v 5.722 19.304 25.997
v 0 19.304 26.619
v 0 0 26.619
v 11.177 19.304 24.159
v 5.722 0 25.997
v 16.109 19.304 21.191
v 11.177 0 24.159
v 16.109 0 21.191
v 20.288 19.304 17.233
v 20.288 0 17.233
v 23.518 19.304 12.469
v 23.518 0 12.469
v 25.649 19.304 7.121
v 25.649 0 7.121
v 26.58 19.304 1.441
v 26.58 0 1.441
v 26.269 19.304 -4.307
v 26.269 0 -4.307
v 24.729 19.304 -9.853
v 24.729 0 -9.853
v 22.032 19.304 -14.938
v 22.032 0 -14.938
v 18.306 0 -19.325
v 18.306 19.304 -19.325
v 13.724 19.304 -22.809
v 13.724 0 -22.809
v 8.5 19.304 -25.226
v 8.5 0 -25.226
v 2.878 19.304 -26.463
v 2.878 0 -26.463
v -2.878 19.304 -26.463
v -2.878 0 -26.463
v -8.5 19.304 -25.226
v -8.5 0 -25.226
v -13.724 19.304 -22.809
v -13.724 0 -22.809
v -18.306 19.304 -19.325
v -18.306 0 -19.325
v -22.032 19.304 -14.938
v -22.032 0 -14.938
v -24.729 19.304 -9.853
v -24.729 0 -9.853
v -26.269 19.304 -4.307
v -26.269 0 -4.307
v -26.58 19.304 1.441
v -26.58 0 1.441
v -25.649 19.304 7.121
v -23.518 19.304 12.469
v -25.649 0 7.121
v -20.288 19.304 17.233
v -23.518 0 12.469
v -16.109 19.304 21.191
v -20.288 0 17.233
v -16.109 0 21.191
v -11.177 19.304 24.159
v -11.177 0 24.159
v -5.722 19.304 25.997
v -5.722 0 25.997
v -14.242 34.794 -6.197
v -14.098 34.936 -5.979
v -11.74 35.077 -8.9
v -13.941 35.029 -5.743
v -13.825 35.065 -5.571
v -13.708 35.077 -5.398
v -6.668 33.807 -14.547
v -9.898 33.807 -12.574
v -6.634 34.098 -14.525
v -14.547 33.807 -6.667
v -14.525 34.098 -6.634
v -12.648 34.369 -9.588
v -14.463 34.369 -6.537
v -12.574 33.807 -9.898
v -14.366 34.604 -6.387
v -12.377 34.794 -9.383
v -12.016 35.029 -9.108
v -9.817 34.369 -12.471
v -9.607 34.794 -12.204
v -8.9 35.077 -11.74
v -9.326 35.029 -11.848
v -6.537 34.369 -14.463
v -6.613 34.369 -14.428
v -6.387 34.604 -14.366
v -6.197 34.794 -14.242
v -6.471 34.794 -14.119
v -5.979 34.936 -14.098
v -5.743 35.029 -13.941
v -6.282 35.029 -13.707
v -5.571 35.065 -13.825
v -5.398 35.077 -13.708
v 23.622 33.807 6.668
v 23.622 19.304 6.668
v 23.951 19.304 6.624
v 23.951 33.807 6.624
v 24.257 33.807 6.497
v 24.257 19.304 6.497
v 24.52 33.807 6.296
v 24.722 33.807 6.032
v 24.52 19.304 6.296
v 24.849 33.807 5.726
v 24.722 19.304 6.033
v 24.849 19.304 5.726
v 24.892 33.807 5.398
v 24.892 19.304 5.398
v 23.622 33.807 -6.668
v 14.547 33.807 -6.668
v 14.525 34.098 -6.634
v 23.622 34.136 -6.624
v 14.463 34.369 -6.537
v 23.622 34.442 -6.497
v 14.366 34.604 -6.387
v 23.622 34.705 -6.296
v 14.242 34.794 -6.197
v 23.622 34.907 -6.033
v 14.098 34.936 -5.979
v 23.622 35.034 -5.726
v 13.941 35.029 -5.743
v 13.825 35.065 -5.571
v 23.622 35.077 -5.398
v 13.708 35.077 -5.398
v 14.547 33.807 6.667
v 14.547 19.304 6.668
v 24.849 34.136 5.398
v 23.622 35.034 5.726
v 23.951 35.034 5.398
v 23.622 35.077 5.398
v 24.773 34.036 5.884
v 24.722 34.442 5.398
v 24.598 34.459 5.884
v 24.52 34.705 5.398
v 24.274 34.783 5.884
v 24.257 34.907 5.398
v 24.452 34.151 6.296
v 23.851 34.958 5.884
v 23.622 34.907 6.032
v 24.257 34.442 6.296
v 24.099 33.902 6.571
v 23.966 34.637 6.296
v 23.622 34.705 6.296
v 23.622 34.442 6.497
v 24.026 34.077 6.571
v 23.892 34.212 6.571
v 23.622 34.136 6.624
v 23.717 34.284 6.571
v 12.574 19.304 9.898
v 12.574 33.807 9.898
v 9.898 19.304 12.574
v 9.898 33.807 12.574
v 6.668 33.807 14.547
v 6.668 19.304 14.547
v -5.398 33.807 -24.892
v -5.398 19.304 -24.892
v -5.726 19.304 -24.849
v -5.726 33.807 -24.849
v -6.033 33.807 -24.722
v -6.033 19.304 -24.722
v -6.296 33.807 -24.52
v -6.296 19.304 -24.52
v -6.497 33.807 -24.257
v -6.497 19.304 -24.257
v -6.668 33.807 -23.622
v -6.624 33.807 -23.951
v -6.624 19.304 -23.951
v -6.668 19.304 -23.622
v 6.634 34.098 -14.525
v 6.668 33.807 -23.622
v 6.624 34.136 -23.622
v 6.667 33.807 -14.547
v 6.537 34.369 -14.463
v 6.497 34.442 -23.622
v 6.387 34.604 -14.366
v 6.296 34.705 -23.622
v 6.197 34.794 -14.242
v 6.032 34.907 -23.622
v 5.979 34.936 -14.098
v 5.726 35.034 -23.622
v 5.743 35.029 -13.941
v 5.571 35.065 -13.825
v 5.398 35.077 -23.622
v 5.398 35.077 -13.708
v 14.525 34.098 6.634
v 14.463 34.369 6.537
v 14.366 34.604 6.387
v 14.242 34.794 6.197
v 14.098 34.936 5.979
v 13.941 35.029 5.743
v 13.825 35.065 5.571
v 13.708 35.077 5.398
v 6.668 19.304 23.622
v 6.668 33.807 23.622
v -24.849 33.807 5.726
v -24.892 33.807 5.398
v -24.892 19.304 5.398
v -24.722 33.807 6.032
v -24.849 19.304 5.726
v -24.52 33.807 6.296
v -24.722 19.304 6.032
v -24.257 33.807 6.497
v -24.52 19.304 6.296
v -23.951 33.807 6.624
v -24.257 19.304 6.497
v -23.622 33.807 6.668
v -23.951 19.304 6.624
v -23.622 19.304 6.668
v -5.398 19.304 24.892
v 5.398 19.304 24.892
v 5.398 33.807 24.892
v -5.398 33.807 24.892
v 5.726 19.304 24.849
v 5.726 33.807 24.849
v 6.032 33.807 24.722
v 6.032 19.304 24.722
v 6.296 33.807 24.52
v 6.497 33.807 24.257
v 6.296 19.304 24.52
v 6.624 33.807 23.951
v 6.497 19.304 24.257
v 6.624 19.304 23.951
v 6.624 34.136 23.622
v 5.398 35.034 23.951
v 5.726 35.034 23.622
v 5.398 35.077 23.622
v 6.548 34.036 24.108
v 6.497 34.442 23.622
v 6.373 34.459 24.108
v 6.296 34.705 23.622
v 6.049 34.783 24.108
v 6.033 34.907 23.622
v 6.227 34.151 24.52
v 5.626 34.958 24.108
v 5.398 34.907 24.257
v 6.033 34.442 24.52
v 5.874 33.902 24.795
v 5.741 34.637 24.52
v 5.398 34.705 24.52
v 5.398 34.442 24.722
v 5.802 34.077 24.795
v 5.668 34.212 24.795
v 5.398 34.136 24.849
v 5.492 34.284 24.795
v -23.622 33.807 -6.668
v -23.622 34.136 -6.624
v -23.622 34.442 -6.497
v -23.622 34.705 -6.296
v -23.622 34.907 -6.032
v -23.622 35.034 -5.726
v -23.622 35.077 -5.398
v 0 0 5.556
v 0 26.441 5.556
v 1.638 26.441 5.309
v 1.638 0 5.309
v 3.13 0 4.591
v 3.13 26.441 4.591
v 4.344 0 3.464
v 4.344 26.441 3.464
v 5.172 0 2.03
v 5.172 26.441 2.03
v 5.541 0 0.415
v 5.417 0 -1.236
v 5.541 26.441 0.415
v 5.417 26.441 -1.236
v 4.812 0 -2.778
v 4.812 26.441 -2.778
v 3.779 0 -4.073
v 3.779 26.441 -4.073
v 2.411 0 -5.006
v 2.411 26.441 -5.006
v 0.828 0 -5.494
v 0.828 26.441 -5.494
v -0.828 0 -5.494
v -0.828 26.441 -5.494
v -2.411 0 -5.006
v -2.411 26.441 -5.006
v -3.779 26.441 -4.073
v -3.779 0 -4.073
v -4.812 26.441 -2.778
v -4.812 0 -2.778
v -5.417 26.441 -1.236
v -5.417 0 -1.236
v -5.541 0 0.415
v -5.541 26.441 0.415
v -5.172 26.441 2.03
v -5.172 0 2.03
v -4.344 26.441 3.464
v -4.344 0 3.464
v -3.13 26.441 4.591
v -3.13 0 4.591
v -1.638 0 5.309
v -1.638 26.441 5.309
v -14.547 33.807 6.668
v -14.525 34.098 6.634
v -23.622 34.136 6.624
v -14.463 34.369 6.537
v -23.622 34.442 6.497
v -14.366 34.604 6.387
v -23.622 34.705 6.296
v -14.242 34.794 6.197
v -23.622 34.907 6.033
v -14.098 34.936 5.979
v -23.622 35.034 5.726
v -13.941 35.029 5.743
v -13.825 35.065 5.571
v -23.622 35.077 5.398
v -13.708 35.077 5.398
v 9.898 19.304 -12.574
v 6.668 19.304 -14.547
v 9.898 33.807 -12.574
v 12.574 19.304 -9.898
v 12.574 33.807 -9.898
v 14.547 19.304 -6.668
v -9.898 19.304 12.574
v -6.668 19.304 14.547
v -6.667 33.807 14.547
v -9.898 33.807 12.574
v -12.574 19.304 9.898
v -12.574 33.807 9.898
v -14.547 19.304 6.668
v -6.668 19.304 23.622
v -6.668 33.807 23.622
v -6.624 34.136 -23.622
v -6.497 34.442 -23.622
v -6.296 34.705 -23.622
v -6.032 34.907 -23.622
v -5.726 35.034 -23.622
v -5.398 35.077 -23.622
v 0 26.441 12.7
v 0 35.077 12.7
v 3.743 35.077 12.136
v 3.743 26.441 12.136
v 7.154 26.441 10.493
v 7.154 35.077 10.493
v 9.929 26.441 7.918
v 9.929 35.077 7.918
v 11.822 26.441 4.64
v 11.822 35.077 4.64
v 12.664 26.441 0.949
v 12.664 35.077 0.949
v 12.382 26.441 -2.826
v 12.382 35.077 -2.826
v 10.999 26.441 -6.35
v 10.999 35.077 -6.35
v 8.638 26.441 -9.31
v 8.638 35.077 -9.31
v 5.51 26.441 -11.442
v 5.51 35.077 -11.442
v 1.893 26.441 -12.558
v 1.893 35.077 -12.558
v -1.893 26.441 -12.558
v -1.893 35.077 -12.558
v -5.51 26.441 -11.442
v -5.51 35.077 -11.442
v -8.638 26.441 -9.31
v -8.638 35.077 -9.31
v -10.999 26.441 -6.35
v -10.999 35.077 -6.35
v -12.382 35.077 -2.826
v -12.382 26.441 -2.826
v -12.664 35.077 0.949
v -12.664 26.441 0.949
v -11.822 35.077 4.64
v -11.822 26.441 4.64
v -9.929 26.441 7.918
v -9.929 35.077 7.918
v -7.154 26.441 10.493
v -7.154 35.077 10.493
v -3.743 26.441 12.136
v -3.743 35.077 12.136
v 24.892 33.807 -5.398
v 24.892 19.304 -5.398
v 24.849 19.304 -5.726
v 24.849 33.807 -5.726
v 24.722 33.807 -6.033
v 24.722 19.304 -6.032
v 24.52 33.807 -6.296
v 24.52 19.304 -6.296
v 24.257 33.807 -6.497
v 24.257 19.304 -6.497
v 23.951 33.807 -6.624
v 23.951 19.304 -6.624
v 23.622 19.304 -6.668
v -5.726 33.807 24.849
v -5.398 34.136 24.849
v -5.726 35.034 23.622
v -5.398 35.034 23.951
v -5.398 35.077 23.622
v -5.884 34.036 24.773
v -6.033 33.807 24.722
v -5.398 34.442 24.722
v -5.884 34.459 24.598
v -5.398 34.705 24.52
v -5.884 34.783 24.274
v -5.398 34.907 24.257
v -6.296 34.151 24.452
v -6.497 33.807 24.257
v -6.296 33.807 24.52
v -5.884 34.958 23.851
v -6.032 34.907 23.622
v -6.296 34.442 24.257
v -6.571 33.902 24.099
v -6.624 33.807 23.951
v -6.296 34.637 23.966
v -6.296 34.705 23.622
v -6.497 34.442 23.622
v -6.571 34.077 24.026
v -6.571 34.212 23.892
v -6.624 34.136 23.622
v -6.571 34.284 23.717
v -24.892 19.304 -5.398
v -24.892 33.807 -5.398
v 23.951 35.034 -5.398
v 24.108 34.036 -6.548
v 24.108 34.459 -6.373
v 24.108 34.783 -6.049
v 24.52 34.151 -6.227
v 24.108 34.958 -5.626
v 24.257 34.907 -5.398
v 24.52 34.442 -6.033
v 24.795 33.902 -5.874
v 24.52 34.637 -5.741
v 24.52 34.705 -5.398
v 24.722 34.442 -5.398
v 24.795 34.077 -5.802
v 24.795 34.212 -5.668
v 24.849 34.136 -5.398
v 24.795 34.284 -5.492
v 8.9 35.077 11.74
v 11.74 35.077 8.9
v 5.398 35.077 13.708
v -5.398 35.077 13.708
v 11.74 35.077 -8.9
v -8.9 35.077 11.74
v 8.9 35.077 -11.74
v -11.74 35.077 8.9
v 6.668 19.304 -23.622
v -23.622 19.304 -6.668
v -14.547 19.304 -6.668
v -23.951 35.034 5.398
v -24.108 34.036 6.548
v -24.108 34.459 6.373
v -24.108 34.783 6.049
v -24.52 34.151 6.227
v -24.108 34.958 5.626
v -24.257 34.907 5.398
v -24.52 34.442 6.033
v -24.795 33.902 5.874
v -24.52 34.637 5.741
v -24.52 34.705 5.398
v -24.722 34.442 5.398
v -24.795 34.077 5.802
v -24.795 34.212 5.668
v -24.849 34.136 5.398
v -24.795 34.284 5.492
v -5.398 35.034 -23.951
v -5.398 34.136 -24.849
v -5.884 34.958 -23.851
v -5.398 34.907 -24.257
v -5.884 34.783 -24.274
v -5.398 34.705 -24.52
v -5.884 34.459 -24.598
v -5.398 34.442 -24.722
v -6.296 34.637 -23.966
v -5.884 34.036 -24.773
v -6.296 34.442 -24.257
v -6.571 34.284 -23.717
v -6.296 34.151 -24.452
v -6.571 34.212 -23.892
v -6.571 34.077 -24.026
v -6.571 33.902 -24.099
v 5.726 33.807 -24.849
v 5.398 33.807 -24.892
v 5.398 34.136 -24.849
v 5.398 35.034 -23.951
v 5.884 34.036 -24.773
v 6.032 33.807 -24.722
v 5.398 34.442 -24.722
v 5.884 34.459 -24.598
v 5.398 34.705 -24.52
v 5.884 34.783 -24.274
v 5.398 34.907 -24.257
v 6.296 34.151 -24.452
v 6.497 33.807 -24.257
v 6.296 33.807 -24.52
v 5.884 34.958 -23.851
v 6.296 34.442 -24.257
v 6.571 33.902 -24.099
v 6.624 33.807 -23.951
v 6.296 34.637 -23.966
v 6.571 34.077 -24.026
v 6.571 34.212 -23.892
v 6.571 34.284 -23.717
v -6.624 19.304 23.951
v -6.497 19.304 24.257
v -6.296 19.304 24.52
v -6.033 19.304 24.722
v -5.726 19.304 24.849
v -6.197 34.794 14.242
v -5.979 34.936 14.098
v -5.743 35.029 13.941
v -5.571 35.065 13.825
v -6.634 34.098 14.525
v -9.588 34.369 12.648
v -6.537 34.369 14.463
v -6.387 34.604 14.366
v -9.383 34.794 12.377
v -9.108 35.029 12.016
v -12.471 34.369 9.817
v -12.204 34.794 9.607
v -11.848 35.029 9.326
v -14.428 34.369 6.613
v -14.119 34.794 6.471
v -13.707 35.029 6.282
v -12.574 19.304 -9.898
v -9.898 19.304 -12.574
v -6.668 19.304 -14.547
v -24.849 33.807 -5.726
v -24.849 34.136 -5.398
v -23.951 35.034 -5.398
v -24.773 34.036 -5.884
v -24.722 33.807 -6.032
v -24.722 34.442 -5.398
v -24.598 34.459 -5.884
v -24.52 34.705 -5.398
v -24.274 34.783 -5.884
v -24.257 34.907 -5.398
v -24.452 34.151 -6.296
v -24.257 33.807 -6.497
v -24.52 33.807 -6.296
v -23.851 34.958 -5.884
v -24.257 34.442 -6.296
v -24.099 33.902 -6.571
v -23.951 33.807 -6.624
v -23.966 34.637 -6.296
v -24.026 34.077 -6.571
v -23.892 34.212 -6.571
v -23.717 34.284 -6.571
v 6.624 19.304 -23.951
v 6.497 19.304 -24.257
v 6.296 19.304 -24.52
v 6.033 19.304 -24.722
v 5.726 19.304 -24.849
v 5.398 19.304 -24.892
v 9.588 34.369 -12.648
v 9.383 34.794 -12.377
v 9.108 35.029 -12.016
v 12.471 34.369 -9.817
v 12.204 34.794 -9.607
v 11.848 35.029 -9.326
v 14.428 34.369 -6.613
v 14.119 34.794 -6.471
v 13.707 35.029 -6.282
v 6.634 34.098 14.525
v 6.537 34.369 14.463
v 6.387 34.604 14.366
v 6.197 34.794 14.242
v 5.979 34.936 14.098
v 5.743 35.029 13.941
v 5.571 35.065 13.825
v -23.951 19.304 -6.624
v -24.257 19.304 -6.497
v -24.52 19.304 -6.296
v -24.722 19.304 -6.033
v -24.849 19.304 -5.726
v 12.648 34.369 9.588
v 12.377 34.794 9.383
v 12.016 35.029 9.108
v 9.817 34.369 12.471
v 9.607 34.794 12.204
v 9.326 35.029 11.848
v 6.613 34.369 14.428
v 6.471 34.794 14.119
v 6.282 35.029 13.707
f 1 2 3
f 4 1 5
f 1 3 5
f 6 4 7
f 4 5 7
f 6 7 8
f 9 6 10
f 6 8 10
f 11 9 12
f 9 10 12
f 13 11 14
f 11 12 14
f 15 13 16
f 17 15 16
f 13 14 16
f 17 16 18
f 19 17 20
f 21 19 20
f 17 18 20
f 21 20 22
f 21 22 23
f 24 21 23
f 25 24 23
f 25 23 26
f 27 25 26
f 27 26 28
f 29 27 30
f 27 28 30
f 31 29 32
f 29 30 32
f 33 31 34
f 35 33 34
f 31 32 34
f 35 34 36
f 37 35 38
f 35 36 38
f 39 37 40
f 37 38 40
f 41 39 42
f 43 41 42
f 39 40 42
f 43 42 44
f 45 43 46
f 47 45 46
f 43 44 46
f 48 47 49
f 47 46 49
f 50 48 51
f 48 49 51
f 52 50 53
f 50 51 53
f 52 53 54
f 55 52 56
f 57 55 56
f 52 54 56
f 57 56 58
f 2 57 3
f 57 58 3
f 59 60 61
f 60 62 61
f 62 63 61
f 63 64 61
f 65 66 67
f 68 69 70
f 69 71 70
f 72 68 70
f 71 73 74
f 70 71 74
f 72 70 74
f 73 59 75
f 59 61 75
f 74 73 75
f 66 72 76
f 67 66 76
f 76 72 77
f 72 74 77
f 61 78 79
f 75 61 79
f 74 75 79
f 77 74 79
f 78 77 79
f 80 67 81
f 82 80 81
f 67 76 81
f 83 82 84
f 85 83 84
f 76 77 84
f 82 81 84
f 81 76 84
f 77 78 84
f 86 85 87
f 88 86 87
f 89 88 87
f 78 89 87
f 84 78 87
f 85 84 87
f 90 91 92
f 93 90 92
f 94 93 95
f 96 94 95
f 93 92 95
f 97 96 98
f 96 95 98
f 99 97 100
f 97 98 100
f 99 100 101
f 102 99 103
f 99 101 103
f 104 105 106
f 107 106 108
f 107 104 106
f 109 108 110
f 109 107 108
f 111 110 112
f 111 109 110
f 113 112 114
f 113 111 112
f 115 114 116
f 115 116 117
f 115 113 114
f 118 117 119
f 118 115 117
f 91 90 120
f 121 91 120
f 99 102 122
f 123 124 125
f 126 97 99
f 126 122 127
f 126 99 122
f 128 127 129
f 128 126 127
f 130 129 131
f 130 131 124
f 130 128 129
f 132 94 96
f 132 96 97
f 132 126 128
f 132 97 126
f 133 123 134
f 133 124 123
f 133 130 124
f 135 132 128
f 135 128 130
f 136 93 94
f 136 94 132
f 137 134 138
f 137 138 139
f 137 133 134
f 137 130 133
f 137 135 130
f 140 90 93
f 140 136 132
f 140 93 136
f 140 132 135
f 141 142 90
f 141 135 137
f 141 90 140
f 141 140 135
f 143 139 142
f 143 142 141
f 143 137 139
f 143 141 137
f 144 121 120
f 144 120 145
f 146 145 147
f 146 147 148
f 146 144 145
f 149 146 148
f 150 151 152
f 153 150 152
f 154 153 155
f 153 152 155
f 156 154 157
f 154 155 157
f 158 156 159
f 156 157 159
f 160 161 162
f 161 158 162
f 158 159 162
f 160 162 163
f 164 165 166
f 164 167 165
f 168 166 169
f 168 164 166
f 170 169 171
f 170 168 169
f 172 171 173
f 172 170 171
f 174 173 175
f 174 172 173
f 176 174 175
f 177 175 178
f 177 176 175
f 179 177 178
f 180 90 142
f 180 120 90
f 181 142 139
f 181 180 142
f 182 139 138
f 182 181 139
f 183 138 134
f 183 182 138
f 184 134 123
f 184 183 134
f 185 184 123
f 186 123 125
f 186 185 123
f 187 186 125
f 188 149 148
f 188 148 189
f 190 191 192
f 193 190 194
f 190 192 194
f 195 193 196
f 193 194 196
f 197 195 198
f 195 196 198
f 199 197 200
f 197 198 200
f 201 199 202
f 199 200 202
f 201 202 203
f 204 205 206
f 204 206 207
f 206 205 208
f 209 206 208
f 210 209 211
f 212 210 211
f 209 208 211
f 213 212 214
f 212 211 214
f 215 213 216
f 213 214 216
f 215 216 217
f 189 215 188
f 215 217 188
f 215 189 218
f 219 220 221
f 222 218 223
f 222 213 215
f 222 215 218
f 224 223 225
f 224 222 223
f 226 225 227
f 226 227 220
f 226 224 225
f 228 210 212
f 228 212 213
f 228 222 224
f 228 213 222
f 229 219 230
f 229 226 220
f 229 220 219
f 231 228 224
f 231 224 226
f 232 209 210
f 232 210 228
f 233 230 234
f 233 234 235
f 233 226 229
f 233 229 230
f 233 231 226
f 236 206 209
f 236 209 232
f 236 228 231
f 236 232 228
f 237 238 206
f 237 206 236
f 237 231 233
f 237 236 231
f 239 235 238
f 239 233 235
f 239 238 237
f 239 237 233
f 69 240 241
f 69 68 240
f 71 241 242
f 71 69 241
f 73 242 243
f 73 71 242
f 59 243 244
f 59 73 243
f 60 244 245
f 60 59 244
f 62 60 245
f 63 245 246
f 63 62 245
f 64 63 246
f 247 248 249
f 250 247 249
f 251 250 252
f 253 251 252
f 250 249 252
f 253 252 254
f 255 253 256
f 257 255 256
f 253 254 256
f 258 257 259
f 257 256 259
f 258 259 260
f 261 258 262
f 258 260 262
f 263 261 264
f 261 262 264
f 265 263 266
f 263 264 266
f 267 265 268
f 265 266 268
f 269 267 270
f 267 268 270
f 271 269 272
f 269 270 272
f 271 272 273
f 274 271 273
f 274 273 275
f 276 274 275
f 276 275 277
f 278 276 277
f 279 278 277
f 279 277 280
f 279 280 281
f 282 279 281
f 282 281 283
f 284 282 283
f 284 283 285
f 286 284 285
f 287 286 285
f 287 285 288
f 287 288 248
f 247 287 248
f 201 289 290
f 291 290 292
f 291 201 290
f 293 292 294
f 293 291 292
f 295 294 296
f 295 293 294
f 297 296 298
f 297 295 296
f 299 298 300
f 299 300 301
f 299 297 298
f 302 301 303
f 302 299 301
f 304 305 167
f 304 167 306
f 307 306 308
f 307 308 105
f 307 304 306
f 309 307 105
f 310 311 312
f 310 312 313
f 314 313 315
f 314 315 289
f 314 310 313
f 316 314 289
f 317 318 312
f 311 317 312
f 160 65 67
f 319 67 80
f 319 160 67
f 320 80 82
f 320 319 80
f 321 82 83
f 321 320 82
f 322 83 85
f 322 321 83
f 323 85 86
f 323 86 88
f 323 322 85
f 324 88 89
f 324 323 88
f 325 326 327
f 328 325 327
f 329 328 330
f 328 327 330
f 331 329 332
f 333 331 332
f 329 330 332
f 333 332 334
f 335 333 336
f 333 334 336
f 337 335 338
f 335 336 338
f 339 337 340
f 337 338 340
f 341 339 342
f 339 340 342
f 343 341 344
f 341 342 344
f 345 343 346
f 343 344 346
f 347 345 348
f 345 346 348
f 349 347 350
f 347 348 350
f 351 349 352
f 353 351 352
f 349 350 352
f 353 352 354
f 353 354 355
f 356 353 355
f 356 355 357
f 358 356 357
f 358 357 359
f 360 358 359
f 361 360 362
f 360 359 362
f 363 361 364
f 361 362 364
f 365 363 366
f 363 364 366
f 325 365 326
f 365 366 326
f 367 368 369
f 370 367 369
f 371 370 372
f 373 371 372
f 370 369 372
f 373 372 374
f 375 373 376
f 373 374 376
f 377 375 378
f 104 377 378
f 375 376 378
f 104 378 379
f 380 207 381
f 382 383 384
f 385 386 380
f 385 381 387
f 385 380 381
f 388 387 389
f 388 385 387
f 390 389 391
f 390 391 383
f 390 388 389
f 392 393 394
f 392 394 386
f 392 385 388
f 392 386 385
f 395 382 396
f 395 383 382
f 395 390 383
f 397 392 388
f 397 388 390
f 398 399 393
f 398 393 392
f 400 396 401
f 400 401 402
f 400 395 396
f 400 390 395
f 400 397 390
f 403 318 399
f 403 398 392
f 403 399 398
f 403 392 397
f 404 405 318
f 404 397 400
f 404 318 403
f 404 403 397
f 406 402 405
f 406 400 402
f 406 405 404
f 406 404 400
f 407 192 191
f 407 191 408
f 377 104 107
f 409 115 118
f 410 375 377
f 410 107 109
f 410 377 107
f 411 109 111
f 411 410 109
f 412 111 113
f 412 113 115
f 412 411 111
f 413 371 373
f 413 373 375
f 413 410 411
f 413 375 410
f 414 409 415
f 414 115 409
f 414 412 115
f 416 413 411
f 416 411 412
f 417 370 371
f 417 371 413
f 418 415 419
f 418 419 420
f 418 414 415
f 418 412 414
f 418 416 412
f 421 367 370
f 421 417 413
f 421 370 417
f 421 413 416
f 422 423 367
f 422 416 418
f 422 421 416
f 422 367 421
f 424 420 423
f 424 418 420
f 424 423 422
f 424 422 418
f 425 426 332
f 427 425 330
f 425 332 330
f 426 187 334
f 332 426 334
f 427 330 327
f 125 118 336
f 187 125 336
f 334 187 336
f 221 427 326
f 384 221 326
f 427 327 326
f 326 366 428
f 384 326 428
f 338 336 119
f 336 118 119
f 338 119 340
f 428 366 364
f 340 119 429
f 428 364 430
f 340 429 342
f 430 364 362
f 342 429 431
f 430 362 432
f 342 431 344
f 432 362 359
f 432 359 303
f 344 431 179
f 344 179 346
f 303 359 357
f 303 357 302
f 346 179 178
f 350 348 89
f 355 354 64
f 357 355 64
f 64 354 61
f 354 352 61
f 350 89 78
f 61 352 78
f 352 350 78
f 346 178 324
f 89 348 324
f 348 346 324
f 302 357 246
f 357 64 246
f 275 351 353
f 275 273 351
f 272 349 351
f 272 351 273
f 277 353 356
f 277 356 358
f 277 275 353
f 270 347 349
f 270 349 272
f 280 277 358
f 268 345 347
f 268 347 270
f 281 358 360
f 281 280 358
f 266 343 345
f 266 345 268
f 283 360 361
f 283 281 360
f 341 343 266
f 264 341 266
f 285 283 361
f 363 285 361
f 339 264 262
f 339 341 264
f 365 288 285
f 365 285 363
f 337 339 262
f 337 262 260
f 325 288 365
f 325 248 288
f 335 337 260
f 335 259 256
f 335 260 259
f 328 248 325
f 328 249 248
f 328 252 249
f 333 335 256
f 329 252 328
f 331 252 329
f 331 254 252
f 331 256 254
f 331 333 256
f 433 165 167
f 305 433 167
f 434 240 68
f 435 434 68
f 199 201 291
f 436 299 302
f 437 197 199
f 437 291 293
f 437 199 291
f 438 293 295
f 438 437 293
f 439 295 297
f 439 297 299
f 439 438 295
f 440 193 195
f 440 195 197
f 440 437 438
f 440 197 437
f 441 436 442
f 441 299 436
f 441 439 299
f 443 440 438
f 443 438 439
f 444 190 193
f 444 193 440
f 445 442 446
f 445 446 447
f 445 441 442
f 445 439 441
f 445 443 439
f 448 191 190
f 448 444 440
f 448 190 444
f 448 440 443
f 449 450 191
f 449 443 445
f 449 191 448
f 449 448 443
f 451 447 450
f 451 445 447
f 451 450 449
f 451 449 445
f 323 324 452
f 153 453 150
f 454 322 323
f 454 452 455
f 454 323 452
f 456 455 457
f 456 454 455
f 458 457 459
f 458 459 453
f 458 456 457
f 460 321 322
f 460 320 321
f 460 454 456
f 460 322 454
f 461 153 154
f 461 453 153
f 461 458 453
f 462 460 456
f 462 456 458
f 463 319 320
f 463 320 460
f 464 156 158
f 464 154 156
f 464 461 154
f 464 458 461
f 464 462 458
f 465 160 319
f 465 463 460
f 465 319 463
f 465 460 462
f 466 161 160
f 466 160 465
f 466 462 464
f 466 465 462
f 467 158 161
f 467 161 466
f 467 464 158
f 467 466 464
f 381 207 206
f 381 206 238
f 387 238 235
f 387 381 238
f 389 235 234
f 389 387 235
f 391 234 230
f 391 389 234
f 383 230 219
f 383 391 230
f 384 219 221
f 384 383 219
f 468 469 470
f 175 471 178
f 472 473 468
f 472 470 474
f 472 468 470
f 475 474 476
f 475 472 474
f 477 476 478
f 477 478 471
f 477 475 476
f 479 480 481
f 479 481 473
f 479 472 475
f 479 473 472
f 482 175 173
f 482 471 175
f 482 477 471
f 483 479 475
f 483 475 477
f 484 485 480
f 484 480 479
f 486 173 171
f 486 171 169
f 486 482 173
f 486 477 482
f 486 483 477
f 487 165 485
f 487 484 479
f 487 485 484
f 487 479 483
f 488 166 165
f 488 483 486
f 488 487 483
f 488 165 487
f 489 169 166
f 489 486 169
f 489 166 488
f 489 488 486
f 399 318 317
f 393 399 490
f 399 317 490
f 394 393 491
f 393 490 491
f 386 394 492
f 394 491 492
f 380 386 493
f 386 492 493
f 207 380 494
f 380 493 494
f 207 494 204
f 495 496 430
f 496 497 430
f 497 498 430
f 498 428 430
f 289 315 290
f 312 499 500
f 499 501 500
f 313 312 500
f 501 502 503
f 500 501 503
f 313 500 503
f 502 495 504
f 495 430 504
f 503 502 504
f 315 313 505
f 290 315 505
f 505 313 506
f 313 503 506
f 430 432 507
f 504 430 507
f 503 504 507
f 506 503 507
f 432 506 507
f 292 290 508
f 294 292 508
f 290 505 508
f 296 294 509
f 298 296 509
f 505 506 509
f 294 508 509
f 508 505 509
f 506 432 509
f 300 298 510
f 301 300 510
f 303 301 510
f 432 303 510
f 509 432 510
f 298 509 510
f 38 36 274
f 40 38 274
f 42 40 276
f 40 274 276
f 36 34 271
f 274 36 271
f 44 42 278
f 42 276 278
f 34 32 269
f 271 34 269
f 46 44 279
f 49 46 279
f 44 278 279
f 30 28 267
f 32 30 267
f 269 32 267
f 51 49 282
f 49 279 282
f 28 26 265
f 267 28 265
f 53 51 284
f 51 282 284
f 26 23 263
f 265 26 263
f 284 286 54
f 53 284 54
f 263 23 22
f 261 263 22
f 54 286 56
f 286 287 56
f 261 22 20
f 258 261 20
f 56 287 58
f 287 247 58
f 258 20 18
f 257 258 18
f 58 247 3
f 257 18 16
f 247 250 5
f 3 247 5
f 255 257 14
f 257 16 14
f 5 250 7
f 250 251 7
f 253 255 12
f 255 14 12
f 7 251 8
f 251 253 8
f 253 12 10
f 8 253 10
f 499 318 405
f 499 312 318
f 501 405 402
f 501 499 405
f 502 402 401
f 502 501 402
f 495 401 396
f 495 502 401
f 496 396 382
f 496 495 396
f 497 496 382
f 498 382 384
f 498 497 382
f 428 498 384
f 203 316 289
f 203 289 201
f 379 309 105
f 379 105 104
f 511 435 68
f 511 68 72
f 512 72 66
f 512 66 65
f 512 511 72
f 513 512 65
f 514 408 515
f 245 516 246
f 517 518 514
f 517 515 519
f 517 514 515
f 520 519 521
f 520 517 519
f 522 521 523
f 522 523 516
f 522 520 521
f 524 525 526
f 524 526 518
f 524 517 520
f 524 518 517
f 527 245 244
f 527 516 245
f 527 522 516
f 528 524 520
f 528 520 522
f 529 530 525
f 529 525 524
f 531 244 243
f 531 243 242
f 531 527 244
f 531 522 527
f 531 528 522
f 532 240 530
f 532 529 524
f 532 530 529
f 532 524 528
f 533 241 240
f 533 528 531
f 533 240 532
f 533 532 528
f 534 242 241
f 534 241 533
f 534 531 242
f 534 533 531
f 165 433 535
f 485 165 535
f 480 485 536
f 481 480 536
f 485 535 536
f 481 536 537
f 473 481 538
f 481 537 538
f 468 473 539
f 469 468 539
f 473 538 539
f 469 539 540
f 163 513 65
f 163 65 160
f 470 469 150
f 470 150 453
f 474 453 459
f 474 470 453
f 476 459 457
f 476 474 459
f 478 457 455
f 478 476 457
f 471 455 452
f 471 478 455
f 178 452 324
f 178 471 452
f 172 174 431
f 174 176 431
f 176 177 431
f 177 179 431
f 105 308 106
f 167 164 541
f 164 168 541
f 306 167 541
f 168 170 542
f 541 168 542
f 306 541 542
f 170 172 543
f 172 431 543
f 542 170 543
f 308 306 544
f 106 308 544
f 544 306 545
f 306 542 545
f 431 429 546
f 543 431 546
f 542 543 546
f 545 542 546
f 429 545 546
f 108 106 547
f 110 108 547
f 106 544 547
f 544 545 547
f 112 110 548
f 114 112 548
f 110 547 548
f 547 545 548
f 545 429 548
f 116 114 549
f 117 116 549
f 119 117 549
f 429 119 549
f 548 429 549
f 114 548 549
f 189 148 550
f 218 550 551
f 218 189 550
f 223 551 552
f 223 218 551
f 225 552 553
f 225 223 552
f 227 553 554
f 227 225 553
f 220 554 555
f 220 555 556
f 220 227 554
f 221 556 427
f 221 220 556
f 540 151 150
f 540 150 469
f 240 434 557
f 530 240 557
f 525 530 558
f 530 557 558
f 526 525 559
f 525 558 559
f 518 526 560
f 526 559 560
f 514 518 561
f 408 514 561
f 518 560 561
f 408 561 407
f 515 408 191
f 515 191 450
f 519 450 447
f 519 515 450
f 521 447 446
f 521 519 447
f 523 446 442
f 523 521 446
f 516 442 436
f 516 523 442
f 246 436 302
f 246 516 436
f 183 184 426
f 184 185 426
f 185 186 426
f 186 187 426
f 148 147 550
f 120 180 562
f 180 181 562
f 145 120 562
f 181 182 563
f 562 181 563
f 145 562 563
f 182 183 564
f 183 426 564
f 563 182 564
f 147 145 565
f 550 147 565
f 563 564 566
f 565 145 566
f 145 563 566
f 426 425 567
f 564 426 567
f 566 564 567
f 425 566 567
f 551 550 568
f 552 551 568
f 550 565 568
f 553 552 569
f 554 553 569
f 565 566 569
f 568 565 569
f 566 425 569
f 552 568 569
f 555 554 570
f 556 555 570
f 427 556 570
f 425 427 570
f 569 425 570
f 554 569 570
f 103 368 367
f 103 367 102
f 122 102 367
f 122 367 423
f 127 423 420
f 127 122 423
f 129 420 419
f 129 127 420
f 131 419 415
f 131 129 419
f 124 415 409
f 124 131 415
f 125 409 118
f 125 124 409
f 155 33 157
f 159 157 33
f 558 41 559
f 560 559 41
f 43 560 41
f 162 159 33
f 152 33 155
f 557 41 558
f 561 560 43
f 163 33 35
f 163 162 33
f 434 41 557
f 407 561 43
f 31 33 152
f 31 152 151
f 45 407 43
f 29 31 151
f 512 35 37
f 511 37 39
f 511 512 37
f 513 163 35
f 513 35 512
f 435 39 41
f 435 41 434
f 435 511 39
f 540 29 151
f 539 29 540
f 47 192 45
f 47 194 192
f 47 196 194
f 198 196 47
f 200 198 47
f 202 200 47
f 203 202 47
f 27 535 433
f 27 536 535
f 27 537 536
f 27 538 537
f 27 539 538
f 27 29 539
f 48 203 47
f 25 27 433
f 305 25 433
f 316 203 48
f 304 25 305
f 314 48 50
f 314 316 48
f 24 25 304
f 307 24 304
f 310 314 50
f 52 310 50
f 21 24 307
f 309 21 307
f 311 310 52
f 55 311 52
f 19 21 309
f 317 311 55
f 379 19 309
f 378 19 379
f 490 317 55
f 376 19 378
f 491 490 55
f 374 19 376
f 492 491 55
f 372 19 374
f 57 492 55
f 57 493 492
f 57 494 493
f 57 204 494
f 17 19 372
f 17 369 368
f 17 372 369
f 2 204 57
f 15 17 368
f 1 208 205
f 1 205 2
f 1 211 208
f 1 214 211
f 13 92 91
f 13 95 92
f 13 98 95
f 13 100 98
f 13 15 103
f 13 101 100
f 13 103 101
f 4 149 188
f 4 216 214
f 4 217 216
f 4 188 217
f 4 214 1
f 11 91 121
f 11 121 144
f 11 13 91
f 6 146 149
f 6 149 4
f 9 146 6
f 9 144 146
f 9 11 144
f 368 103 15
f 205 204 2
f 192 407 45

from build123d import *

# Parameters (mm, degrees)
SKETCH1_R           = 26.6192
BOSS_EXTRUDE1_DEPTH = 19.304
BOSS_EXTRUDE2_DEPTH = 15.7734
SKETCH3_R           = 12.7
CUT_EXTRUDE1_DEPTH  = 8.636
SKETCH4_R           = 5.55625
CUT_EXTRUDE2_DEPTH  = 47.003383041
FILLET1_R           = 1.27
FILLET2_R           = 1.27


with BuildPart() as part:
    # Sketch1 → Boss-Extrude1 (new body)
    with BuildSketch(Plane(origin=(0, 0, 0), x_dir=(1, 0, 0), z_dir=(0, 1, 0))):
        with Locations(Location((0, 0, 0), (0, 0, 270))):
            Circle(SKETCH1_R)
    extrude(amount=BOSS_EXTRUDE1_DEPTH)

    # Sketch2 → Boss-Extrude2 (add)
    with BuildSketch(Plane(origin=(0, 19.304, 0), x_dir=(1, 0, 0), z_dir=(0, 1, 0))):
        with BuildLine():
            Line((-6.6675, 14.546767605), (-6.6675, 24.892))
            Line((-6.6675, 24.892), (6.6675, 24.892))
            Line((6.6675, 24.892), (6.6675, 14.546767605))
            ThreePointArc((6.6675, 14.546767605), (11.315122713, 11.315122713), (14.546767605, 6.6675))
            Line((14.546767605, 6.6675), (24.892, 6.6675))
            Line((24.892, 6.6675), (24.892, -6.6675))
            Line((24.892, -6.6675), (14.546767605, -6.6675))
            ThreePointArc((14.546767605, -6.6675), (11.315122713, -11.315122713), (6.6675, -14.546767605))
            Line((6.6675, -14.546767605), (6.6675, -24.892))
            Line((6.6675, -24.892), (-6.6675, -24.892))
            Line((-6.6675, -24.892), (-6.6675, -14.546767605))
            ThreePointArc((-6.6675, -14.546767605), (-11.315122713, -11.315122713), (-14.546767605, -6.6675))
            Line((-14.546767605, -6.6675), (-24.892, -6.6675))
            Line((-24.892, -6.6675), (-24.892, 6.6675))
            Line((-24.892, 6.6675), (-14.546767605, 6.6675))
            ThreePointArc((-14.546767605, 6.6675), (-11.315122713, 11.315122713), (-6.6675, 14.546767605))
        make_face()
    extrude(amount=BOSS_EXTRUDE2_DEPTH)

    # Sketch3 → Cut-Extrude1 (cut)
    with BuildSketch(Plane(origin=(0, 35.0774, 0), x_dir=(1, 0, 0), z_dir=(0, 1, 0))):
        with Locations(Location((0, 0, 0), (0, 0, 270))):
            Circle(SKETCH3_R)
    extrude(amount=-CUT_EXTRUDE1_DEPTH, mode=Mode.SUBTRACT)

    # Sketch4 → Cut-Extrude2 (cut, through all)
    with BuildSketch(Plane(origin=(0, 26.4414, 0), x_dir=(1, 0, 0), z_dir=(0, 1, 0))):
        with Locations(Location((0, 0, 0), (0, 0, 270))):
            Circle(SKETCH4_R)
    extrude(amount=-CUT_EXTRUDE2_DEPTH, mode=Mode.SUBTRACT)

    # Fillet1
    fillet1_edges = [part.edges().sort_by_distance(p)[0] for p in [
        (-11.315122713, 35.0774, -11.315122713),
        (-19.719383802, 35.0774, -6.6675),
        (-24.892, 35.0774, 0),
        (-19.719383802, 35.0774, 6.6675),
        (-11.315122713, 35.0774, 11.315122713),
        (-6.6675, 35.0774, 19.719383802),
        (0, 35.0774, 24.892),
        (6.6675, 35.0774, 19.719383802),
        (11.315122713, 35.0774, 11.315122713),
        (19.719383802, 35.0774, 6.6675),
        (24.892, 35.0774, 0),
        (19.719383802, 35.0774, -6.6675),
        (11.315122713, 35.0774, -11.315122713),
        (6.6675, 35.0774, -19.719383802),
        (0, 35.0774, -24.892),
        (-6.6675, 35.0774, -19.719383802),
    ]]
    fillet(fillet1_edges, radius=FILLET1_R)

    # Fillet2
    # the kernel refuses this fillet: 1.27 mm, written as the material it takes off along each edge
    with BuildSketch(Plane(origin=(5.3975, 33.8074, -23.622), x_dir=(0, 0, -1), z_dir=(1, 0, 0))) as fillet2_piece_1_section:
        Polygon((0, 0), (FILLET2_R, 0), (FILLET2_R, FILLET2_R), (0, FILLET2_R), align=None)
    fillet2_piece_1 = extrude(amount=FILLET2_R, mode=Mode.PRIVATE)
    fillet2_piece_1 = fillet2_piece_1 - Plane(origin=(5.3975, 33.8074, -23.622), x_dir=(0, -0.7071067811865475, 0.7071067811865475), z_dir=(1, 0, 0)) * Sphere(FILLET2_R, mode=Mode.PRIVATE)
    add(fillet2_piece_1, mode=Mode.SUBTRACT)
    with BuildSketch(Plane(origin=(23.622, 33.8074, -5.3975), x_dir=(0, 0, -1), z_dir=(1, 0, 0))) as fillet2_piece_2_section:
        Polygon((0, 0), (FILLET2_R, 0), (FILLET2_R, FILLET2_R), (0, FILLET2_R), align=None)
    fillet2_piece_2 = extrude(amount=FILLET2_R, mode=Mode.PRIVATE)
    fillet2_piece_2 = fillet2_piece_2 - Plane(origin=(23.622, 33.8074, -5.3975), x_dir=(0, -0.7071067811865475, 0.7071067811865475), z_dir=(1, 0, 0)) * Sphere(FILLET2_R, mode=Mode.PRIVATE)
    add(fillet2_piece_2, mode=Mode.SUBTRACT)
    with BuildSketch(Plane(origin=(-5.3975, 33.8074, -23.622), x_dir=(0, 0, -1), z_dir=(-1, 0, 0))) as fillet2_piece_3_section:
        Polygon((0, 0), (FILLET2_R, 0), (FILLET2_R, -FILLET2_R), (0, -FILLET2_R), align=None)
    fillet2_piece_3 = extrude(amount=FILLET2_R, mode=Mode.PRIVATE)
    fillet2_piece_3 = fillet2_piece_3 - Plane(origin=(-5.3975, 33.8074, -23.622), x_dir=(0, -0.7071067811865475, 0.7071067811865475), z_dir=(-1, 0, 0)) * Sphere(FILLET2_R, mode=Mode.PRIVATE)
    add(fillet2_piece_3, mode=Mode.SUBTRACT)
    with BuildSketch(Plane(origin=(23.622, 33.8074, 5.3975), x_dir=(1, 0, 0), z_dir=(0, 0, 1))) as fillet2_piece_4_section:
        Polygon((0, 0), (FILLET2_R, 0), (FILLET2_R, FILLET2_R), (0, FILLET2_R), align=None)
    fillet2_piece_4 = extrude(amount=FILLET2_R, mode=Mode.PRIVATE)
    fillet2_piece_4 = fillet2_piece_4 - Plane(origin=(23.622, 33.8074, 5.3975), x_dir=(-0.7071067811865475, -0.7071067811865475, 0), z_dir=(0, 0, 1)) * Sphere(FILLET2_R, mode=Mode.PRIVATE)
    add(fillet2_piece_4, mode=Mode.SUBTRACT)
    with BuildSketch(Plane(origin=(-23.622, 33.8074, -5.3975), x_dir=(-1, 0, 0), z_dir=(0, 0, -1))) as fillet2_piece_5_section:
        Polygon((0, 0), (FILLET2_R, 0), (FILLET2_R, FILLET2_R), (0, FILLET2_R), align=None)
    fillet2_piece_5 = extrude(amount=FILLET2_R, mode=Mode.PRIVATE)
    fillet2_piece_5 = fillet2_piece_5 - Plane(origin=(-23.622, 33.8074, -5.3975), x_dir=(0.7071067811865475, -0.7071067811865475, 0), z_dir=(0, 0, -1)) * Sphere(FILLET2_R, mode=Mode.PRIVATE)
    add(fillet2_piece_5, mode=Mode.SUBTRACT)
    with BuildSketch(Plane(origin=(5.3975, 33.8074, 23.622), x_dir=(1, 0, 0), z_dir=(0, 0, 1))) as fillet2_piece_6_section:
        Polygon((0, 0), (FILLET2_R, 0), (FILLET2_R, FILLET2_R), (0, FILLET2_R), align=None)
    fillet2_piece_6 = extrude(amount=FILLET2_R, mode=Mode.PRIVATE)
    fillet2_piece_6 = fillet2_piece_6 - Plane(origin=(5.3975, 33.8074, 23.622), x_dir=(-0.7071067811865475, -0.7071067811865475, 0), z_dir=(0, 0, 1)) * Sphere(FILLET2_R, mode=Mode.PRIVATE)
    add(fillet2_piece_6, mode=Mode.SUBTRACT)
    with BuildSketch(Plane(origin=(-23.622, 33.8074, 5.3975), x_dir=(0, 0, 1), z_dir=(-1, 0, 0))) as fillet2_piece_7_section:
        Polygon((0, 0), (FILLET2_R, 0), (FILLET2_R, FILLET2_R), (0, FILLET2_R), align=None)
    fillet2_piece_7 = extrude(amount=FILLET2_R, mode=Mode.PRIVATE)
    fillet2_piece_7 = fillet2_piece_7 - Plane(origin=(-23.622, 33.8074, 5.3975), x_dir=(0, -0.7071067811865475, -0.7071067811865475), z_dir=(-1, 0, 0)) * Sphere(FILLET2_R, mode=Mode.PRIVATE)
    add(fillet2_piece_7, mode=Mode.SUBTRACT)
    with BuildSketch(Plane(origin=(-5.3975, 33.8074, 23.622), x_dir=(0, 0, 1), z_dir=(-1, 0, 0))) as fillet2_piece_8_section:
        Polygon((0, 0), (FILLET2_R, 0), (FILLET2_R, FILLET2_R), (0, FILLET2_R), align=None)
    fillet2_piece_8 = extrude(amount=FILLET2_R, mode=Mode.PRIVATE)
    fillet2_piece_8 = fillet2_piece_8 - Plane(origin=(-5.3975, 33.8074, 23.622), x_dir=(0, -0.7071067811865475, -0.7071067811865475), z_dir=(-1, 0, 0)) * Sphere(FILLET2_R, mode=Mode.PRIVATE)
    add(fillet2_piece_8, mode=Mode.SUBTRACT)
    with BuildSketch(Plane(origin=(-6.6675, 19.304, 24.892), x_dir=(0, 0, -1), z_dir=(0, 1, 0)), Plane(origin=(6.6675, 19.304, 24.892), x_dir=(-1, 0, 0), z_dir=(0, 1, 0)), Plane(origin=(24.892, 19.304, 6.6675), x_dir=(-1, 0, 0), z_dir=(0, 1, 0)), Plane(origin=(24.892, 19.304, -6.6675), x_dir=(0, 0, 1), z_dir=(0, 1, 0)), Plane(origin=(6.6675, 19.304, -24.892), x_dir=(0, 0, 1), z_dir=(0, 1, 0)), Plane(origin=(-24.892, 19.304, -6.6675), x_dir=(1, 0, 0), z_dir=(0, 1, 0)), Plane(origin=(-24.892, 19.304, 6.6675), x_dir=(0, 0, -1), z_dir=(0, 1, 0))) as fillet2_piece_9:
        with BuildLine():
            CenterArc((FILLET2_R, -FILLET2_R), FILLET2_R, 90, 90)
            Line((0, -FILLET2_R), (0, 0))
            Line((0, 0), (FILLET2_R, 0))
        make_face()
    extrude(amount=14.5034, mode=Mode.SUBTRACT)
    with BuildSketch(Plane(origin=(-6.6675, 19.304, -24.892), x_dir=(0, 0, 1), z_dir=(0, 1, 0))) as fillet2_piece_10:
        with BuildLine():
            CenterArc((FILLET2_R, FILLET2_R), FILLET2_R, 180, 90)
            Line((0, FILLET2_R), (0, 0))
            Line((0, 0), (FILLET2_R, 0))
        make_face()
    extrude(amount=14.5034, mode=Mode.SUBTRACT)


solid = part.part
